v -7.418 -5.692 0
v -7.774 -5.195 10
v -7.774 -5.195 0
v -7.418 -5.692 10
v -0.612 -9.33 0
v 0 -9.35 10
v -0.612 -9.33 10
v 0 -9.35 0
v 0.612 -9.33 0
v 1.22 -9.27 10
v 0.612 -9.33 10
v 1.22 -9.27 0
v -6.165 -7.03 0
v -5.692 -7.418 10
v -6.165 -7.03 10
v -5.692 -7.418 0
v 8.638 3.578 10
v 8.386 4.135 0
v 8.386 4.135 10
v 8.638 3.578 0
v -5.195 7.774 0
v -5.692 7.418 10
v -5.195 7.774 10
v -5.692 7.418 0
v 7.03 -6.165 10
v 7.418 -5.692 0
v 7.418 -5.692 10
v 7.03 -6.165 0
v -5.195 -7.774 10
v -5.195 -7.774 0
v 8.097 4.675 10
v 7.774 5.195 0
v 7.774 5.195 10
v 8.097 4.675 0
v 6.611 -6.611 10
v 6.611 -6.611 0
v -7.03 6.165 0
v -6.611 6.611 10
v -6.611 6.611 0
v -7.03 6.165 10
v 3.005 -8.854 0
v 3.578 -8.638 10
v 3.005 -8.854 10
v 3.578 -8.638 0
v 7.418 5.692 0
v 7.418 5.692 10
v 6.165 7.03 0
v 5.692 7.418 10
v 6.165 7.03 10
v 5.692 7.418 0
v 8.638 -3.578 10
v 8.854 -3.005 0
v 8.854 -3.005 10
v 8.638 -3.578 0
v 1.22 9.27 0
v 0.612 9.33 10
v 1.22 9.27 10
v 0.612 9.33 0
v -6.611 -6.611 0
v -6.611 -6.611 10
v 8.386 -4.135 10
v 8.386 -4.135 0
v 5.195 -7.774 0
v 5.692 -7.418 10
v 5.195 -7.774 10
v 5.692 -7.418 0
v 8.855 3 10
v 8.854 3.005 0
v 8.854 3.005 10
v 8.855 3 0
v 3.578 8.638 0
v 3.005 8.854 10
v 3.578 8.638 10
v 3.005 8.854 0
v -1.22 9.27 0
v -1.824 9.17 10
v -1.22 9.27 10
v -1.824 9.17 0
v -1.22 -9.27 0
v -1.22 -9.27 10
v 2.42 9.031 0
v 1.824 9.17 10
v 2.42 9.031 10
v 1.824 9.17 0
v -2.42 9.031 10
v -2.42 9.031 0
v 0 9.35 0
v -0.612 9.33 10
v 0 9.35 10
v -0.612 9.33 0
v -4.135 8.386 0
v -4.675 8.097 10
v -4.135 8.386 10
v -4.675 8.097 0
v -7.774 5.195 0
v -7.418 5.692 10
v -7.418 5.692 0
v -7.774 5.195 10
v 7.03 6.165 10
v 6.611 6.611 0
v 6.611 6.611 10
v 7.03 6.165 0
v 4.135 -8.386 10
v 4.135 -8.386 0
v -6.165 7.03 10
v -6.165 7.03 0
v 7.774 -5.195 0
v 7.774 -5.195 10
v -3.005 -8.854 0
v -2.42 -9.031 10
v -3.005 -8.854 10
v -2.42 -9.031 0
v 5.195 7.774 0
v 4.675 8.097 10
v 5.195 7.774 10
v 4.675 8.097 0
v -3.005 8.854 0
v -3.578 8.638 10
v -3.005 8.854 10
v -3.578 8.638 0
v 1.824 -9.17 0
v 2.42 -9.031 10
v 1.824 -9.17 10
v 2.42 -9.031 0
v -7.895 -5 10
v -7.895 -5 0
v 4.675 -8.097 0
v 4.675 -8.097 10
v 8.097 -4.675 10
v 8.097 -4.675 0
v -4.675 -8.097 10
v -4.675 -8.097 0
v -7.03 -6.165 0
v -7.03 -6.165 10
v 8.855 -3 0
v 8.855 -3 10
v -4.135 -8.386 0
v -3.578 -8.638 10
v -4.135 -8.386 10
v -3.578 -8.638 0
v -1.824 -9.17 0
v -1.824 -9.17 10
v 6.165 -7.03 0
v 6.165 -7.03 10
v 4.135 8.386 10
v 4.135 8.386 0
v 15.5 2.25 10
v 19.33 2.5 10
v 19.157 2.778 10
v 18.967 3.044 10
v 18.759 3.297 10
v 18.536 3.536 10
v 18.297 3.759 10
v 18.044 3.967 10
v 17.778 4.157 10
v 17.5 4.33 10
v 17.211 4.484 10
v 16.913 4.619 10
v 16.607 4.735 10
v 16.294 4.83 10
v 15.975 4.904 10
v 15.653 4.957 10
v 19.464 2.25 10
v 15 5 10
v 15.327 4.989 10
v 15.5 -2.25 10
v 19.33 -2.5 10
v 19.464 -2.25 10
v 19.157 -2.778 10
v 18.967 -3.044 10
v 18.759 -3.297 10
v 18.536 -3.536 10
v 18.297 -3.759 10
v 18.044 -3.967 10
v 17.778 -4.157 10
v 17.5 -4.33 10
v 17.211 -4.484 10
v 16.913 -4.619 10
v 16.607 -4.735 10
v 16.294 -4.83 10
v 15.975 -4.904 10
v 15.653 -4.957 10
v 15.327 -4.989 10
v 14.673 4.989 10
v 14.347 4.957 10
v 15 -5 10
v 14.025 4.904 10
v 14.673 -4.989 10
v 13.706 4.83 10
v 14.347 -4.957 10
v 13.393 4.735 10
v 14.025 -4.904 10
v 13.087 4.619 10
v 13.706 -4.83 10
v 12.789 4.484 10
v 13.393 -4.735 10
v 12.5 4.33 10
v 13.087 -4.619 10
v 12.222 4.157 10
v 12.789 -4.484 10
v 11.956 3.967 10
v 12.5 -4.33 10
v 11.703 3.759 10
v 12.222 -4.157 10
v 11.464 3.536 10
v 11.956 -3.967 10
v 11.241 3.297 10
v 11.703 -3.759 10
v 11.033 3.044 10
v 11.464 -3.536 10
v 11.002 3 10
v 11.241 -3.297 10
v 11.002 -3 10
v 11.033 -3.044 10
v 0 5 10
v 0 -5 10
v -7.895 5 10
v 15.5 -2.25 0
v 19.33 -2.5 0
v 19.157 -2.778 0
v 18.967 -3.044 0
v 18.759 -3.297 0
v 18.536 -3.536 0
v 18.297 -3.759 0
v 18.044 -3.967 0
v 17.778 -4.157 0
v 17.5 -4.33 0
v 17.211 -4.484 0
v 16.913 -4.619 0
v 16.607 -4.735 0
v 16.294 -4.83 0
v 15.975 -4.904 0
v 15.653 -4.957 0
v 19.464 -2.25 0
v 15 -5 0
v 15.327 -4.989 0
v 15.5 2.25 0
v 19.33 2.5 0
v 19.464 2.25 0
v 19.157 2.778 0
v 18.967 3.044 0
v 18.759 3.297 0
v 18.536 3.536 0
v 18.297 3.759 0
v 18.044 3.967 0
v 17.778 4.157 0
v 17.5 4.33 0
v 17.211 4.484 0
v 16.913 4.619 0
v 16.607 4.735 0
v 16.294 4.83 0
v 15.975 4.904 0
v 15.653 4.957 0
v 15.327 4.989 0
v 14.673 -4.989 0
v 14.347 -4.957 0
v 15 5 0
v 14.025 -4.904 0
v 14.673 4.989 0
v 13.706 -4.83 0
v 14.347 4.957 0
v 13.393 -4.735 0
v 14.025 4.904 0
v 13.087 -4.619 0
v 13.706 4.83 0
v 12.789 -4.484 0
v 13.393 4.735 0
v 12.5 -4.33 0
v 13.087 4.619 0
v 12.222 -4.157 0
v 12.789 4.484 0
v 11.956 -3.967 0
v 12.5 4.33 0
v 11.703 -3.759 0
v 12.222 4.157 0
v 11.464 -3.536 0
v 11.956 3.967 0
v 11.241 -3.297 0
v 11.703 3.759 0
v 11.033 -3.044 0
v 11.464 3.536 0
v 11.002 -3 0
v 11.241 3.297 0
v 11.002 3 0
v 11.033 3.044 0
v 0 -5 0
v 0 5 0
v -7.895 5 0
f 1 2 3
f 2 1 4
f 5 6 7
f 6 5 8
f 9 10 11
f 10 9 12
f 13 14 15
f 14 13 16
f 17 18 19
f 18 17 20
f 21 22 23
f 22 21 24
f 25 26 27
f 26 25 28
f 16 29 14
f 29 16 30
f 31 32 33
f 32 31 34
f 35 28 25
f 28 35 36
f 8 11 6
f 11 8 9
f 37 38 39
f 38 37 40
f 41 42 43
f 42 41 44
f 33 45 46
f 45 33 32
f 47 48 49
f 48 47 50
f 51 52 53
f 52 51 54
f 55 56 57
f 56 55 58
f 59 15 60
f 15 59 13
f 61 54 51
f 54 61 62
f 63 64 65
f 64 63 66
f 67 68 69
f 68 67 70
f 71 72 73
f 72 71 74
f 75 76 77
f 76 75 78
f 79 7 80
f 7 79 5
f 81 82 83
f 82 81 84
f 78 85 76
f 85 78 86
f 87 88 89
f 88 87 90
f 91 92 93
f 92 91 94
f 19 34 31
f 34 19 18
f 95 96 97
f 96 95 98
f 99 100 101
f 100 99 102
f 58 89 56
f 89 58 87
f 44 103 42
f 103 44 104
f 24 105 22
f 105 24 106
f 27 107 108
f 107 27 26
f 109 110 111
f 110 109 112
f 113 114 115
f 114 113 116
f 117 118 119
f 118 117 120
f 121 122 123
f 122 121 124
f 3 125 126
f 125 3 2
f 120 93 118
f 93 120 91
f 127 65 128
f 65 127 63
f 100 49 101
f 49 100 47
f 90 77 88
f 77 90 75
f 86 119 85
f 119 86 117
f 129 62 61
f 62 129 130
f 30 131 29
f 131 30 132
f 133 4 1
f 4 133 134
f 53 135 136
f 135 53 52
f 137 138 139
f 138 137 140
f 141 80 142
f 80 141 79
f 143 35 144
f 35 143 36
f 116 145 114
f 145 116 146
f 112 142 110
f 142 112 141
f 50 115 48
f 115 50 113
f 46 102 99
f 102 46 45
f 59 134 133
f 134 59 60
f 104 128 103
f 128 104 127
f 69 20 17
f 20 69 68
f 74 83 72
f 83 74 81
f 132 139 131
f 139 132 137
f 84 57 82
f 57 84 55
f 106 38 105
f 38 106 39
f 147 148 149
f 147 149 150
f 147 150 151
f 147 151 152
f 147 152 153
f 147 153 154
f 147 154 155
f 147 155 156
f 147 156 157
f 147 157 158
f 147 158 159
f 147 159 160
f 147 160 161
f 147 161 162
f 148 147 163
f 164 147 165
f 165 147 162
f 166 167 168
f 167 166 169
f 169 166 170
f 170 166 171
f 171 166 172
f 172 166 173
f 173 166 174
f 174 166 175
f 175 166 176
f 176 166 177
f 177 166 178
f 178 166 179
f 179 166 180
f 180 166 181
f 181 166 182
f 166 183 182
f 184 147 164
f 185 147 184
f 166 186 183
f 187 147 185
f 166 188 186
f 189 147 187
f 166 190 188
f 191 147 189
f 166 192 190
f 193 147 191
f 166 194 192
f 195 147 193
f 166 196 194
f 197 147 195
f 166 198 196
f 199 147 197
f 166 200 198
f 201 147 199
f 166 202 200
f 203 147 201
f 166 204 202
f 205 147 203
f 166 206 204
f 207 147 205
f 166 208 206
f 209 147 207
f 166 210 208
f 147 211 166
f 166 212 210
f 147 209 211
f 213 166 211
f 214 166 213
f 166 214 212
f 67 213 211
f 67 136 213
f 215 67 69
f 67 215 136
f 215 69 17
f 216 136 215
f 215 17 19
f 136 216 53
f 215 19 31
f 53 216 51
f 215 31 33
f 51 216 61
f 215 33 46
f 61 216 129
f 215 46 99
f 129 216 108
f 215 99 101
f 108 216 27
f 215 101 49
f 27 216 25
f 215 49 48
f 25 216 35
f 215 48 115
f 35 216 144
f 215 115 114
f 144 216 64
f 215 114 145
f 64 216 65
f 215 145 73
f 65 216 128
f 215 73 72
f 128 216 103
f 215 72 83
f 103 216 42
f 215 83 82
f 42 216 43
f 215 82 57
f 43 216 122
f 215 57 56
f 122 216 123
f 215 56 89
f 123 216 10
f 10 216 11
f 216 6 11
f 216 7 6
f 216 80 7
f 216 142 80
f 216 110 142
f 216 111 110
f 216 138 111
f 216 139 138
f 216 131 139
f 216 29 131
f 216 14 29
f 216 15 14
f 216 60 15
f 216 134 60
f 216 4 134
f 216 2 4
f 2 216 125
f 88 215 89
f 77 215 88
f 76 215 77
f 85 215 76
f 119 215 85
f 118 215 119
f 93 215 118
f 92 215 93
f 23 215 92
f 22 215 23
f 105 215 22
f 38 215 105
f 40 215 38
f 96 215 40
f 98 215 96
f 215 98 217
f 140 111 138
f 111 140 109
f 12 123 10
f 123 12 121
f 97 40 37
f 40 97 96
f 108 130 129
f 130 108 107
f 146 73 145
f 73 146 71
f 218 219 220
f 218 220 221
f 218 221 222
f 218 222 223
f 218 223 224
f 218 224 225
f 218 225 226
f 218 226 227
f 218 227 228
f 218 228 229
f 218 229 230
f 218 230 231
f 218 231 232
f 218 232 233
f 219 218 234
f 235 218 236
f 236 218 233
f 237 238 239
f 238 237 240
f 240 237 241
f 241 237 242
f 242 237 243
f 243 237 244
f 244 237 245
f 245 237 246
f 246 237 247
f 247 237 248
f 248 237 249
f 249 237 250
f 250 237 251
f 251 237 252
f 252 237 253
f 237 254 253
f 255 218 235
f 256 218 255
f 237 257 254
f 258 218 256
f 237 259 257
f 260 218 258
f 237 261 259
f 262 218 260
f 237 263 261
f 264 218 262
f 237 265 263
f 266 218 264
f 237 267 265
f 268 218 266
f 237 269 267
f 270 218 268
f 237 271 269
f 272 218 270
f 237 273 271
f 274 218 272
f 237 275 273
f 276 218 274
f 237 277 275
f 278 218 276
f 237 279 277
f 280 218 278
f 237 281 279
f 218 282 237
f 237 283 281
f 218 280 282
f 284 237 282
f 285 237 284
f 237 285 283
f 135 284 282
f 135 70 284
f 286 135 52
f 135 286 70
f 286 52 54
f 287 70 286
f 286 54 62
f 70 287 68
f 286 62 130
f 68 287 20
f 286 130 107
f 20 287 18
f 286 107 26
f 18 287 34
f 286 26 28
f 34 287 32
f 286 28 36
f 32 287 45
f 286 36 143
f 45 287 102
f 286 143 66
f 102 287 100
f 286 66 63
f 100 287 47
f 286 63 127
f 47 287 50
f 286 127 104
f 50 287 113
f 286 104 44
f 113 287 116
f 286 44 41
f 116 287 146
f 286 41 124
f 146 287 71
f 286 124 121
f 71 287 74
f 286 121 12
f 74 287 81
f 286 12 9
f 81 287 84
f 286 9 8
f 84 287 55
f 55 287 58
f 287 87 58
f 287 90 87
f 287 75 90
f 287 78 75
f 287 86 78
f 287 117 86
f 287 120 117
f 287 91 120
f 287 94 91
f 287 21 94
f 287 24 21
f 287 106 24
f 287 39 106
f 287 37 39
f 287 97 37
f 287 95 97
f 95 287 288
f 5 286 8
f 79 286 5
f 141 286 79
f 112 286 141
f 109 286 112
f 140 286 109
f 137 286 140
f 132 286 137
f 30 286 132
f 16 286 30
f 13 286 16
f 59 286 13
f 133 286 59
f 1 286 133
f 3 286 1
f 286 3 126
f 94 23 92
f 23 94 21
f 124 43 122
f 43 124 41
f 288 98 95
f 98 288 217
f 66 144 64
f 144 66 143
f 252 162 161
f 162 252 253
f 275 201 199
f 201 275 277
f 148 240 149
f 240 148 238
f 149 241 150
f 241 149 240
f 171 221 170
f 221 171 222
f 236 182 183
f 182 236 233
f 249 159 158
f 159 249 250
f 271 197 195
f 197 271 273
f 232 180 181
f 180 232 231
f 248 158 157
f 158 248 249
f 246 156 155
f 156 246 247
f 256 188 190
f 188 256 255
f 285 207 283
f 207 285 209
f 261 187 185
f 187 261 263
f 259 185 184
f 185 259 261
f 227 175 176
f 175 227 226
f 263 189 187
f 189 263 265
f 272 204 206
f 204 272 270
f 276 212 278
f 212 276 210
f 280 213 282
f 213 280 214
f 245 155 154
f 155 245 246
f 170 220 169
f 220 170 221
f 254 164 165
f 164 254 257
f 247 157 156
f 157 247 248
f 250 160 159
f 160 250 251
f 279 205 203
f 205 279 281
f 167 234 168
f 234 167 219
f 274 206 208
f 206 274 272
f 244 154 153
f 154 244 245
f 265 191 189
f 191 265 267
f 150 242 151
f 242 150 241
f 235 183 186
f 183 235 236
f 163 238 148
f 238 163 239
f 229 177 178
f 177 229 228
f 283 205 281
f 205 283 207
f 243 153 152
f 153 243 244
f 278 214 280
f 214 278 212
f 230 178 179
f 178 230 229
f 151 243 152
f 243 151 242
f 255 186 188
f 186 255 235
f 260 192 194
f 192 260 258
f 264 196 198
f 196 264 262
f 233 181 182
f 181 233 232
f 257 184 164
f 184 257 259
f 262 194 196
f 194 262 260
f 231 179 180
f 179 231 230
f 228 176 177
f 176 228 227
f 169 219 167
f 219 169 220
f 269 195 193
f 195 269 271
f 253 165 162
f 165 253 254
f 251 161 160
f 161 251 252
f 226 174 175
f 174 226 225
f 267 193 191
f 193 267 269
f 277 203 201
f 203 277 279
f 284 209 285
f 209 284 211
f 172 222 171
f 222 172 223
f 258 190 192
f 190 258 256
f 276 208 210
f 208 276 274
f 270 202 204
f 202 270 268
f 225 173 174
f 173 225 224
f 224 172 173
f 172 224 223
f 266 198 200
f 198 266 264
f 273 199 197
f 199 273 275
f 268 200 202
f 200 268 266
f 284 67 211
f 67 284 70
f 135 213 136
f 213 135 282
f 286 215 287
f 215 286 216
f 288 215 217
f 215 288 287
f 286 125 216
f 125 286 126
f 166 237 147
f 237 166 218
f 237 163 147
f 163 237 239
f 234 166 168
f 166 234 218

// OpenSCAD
// Snap-on tubing clip for 12.7 mm lab stand rod
// Print orientation: flat on bed, extruded in +Z

$fn = 96;

// ---- Dimensions (mm) ----
rod_d      = 12.7;   // stand rod diameter
ring_w     = 3;      // rod ring wall thickness
ring_od    = rod_d + 2*ring_w; // rod ring outer diameter (18.7)
opening_w  = 10;     // rod ring opening width (-X side)

tube_d     = 6;      // tubing inner diameter
tube_w     = 2;      // tubing wall thickness
tube_od    = tube_d + 2*tube_w; // tubing outer diameter (10)
tube_x     = 15;     // tubing ring centre X
opening_2  = 4.5;    // tubing opening width (+X side)

bridge_x   = 10;     // bridge X centre
bridge_w   = 6;      // bridge width (Y)
height     = 10;     // extrusion height

eps        = 0.5;    // cut overshoot

// ---- Model ----
difference() {
    union() {
        // Rod ring
        cylinder(d = ring_od, h = height);
        // Tubing ring
        translate([tube_x, 0, 0])
            cylinder(d = tube_od, h = height);
        // Bridge
        translate([bridge_x - 3, -bridge_w/2, 0])
            cube([6, bridge_w, height]);
    }
    // Rod ring opening
    translate([-ring_od/2 - eps, -opening_w/2, 0])
        cube([ring_od/2 + eps, opening_w, height + eps]);
    // Tubing opening
    translate([tube_x + eps, -opening_2/2, 0])
        cube([ring_od/2 + 2*eps, opening_2, height + eps]);
}
